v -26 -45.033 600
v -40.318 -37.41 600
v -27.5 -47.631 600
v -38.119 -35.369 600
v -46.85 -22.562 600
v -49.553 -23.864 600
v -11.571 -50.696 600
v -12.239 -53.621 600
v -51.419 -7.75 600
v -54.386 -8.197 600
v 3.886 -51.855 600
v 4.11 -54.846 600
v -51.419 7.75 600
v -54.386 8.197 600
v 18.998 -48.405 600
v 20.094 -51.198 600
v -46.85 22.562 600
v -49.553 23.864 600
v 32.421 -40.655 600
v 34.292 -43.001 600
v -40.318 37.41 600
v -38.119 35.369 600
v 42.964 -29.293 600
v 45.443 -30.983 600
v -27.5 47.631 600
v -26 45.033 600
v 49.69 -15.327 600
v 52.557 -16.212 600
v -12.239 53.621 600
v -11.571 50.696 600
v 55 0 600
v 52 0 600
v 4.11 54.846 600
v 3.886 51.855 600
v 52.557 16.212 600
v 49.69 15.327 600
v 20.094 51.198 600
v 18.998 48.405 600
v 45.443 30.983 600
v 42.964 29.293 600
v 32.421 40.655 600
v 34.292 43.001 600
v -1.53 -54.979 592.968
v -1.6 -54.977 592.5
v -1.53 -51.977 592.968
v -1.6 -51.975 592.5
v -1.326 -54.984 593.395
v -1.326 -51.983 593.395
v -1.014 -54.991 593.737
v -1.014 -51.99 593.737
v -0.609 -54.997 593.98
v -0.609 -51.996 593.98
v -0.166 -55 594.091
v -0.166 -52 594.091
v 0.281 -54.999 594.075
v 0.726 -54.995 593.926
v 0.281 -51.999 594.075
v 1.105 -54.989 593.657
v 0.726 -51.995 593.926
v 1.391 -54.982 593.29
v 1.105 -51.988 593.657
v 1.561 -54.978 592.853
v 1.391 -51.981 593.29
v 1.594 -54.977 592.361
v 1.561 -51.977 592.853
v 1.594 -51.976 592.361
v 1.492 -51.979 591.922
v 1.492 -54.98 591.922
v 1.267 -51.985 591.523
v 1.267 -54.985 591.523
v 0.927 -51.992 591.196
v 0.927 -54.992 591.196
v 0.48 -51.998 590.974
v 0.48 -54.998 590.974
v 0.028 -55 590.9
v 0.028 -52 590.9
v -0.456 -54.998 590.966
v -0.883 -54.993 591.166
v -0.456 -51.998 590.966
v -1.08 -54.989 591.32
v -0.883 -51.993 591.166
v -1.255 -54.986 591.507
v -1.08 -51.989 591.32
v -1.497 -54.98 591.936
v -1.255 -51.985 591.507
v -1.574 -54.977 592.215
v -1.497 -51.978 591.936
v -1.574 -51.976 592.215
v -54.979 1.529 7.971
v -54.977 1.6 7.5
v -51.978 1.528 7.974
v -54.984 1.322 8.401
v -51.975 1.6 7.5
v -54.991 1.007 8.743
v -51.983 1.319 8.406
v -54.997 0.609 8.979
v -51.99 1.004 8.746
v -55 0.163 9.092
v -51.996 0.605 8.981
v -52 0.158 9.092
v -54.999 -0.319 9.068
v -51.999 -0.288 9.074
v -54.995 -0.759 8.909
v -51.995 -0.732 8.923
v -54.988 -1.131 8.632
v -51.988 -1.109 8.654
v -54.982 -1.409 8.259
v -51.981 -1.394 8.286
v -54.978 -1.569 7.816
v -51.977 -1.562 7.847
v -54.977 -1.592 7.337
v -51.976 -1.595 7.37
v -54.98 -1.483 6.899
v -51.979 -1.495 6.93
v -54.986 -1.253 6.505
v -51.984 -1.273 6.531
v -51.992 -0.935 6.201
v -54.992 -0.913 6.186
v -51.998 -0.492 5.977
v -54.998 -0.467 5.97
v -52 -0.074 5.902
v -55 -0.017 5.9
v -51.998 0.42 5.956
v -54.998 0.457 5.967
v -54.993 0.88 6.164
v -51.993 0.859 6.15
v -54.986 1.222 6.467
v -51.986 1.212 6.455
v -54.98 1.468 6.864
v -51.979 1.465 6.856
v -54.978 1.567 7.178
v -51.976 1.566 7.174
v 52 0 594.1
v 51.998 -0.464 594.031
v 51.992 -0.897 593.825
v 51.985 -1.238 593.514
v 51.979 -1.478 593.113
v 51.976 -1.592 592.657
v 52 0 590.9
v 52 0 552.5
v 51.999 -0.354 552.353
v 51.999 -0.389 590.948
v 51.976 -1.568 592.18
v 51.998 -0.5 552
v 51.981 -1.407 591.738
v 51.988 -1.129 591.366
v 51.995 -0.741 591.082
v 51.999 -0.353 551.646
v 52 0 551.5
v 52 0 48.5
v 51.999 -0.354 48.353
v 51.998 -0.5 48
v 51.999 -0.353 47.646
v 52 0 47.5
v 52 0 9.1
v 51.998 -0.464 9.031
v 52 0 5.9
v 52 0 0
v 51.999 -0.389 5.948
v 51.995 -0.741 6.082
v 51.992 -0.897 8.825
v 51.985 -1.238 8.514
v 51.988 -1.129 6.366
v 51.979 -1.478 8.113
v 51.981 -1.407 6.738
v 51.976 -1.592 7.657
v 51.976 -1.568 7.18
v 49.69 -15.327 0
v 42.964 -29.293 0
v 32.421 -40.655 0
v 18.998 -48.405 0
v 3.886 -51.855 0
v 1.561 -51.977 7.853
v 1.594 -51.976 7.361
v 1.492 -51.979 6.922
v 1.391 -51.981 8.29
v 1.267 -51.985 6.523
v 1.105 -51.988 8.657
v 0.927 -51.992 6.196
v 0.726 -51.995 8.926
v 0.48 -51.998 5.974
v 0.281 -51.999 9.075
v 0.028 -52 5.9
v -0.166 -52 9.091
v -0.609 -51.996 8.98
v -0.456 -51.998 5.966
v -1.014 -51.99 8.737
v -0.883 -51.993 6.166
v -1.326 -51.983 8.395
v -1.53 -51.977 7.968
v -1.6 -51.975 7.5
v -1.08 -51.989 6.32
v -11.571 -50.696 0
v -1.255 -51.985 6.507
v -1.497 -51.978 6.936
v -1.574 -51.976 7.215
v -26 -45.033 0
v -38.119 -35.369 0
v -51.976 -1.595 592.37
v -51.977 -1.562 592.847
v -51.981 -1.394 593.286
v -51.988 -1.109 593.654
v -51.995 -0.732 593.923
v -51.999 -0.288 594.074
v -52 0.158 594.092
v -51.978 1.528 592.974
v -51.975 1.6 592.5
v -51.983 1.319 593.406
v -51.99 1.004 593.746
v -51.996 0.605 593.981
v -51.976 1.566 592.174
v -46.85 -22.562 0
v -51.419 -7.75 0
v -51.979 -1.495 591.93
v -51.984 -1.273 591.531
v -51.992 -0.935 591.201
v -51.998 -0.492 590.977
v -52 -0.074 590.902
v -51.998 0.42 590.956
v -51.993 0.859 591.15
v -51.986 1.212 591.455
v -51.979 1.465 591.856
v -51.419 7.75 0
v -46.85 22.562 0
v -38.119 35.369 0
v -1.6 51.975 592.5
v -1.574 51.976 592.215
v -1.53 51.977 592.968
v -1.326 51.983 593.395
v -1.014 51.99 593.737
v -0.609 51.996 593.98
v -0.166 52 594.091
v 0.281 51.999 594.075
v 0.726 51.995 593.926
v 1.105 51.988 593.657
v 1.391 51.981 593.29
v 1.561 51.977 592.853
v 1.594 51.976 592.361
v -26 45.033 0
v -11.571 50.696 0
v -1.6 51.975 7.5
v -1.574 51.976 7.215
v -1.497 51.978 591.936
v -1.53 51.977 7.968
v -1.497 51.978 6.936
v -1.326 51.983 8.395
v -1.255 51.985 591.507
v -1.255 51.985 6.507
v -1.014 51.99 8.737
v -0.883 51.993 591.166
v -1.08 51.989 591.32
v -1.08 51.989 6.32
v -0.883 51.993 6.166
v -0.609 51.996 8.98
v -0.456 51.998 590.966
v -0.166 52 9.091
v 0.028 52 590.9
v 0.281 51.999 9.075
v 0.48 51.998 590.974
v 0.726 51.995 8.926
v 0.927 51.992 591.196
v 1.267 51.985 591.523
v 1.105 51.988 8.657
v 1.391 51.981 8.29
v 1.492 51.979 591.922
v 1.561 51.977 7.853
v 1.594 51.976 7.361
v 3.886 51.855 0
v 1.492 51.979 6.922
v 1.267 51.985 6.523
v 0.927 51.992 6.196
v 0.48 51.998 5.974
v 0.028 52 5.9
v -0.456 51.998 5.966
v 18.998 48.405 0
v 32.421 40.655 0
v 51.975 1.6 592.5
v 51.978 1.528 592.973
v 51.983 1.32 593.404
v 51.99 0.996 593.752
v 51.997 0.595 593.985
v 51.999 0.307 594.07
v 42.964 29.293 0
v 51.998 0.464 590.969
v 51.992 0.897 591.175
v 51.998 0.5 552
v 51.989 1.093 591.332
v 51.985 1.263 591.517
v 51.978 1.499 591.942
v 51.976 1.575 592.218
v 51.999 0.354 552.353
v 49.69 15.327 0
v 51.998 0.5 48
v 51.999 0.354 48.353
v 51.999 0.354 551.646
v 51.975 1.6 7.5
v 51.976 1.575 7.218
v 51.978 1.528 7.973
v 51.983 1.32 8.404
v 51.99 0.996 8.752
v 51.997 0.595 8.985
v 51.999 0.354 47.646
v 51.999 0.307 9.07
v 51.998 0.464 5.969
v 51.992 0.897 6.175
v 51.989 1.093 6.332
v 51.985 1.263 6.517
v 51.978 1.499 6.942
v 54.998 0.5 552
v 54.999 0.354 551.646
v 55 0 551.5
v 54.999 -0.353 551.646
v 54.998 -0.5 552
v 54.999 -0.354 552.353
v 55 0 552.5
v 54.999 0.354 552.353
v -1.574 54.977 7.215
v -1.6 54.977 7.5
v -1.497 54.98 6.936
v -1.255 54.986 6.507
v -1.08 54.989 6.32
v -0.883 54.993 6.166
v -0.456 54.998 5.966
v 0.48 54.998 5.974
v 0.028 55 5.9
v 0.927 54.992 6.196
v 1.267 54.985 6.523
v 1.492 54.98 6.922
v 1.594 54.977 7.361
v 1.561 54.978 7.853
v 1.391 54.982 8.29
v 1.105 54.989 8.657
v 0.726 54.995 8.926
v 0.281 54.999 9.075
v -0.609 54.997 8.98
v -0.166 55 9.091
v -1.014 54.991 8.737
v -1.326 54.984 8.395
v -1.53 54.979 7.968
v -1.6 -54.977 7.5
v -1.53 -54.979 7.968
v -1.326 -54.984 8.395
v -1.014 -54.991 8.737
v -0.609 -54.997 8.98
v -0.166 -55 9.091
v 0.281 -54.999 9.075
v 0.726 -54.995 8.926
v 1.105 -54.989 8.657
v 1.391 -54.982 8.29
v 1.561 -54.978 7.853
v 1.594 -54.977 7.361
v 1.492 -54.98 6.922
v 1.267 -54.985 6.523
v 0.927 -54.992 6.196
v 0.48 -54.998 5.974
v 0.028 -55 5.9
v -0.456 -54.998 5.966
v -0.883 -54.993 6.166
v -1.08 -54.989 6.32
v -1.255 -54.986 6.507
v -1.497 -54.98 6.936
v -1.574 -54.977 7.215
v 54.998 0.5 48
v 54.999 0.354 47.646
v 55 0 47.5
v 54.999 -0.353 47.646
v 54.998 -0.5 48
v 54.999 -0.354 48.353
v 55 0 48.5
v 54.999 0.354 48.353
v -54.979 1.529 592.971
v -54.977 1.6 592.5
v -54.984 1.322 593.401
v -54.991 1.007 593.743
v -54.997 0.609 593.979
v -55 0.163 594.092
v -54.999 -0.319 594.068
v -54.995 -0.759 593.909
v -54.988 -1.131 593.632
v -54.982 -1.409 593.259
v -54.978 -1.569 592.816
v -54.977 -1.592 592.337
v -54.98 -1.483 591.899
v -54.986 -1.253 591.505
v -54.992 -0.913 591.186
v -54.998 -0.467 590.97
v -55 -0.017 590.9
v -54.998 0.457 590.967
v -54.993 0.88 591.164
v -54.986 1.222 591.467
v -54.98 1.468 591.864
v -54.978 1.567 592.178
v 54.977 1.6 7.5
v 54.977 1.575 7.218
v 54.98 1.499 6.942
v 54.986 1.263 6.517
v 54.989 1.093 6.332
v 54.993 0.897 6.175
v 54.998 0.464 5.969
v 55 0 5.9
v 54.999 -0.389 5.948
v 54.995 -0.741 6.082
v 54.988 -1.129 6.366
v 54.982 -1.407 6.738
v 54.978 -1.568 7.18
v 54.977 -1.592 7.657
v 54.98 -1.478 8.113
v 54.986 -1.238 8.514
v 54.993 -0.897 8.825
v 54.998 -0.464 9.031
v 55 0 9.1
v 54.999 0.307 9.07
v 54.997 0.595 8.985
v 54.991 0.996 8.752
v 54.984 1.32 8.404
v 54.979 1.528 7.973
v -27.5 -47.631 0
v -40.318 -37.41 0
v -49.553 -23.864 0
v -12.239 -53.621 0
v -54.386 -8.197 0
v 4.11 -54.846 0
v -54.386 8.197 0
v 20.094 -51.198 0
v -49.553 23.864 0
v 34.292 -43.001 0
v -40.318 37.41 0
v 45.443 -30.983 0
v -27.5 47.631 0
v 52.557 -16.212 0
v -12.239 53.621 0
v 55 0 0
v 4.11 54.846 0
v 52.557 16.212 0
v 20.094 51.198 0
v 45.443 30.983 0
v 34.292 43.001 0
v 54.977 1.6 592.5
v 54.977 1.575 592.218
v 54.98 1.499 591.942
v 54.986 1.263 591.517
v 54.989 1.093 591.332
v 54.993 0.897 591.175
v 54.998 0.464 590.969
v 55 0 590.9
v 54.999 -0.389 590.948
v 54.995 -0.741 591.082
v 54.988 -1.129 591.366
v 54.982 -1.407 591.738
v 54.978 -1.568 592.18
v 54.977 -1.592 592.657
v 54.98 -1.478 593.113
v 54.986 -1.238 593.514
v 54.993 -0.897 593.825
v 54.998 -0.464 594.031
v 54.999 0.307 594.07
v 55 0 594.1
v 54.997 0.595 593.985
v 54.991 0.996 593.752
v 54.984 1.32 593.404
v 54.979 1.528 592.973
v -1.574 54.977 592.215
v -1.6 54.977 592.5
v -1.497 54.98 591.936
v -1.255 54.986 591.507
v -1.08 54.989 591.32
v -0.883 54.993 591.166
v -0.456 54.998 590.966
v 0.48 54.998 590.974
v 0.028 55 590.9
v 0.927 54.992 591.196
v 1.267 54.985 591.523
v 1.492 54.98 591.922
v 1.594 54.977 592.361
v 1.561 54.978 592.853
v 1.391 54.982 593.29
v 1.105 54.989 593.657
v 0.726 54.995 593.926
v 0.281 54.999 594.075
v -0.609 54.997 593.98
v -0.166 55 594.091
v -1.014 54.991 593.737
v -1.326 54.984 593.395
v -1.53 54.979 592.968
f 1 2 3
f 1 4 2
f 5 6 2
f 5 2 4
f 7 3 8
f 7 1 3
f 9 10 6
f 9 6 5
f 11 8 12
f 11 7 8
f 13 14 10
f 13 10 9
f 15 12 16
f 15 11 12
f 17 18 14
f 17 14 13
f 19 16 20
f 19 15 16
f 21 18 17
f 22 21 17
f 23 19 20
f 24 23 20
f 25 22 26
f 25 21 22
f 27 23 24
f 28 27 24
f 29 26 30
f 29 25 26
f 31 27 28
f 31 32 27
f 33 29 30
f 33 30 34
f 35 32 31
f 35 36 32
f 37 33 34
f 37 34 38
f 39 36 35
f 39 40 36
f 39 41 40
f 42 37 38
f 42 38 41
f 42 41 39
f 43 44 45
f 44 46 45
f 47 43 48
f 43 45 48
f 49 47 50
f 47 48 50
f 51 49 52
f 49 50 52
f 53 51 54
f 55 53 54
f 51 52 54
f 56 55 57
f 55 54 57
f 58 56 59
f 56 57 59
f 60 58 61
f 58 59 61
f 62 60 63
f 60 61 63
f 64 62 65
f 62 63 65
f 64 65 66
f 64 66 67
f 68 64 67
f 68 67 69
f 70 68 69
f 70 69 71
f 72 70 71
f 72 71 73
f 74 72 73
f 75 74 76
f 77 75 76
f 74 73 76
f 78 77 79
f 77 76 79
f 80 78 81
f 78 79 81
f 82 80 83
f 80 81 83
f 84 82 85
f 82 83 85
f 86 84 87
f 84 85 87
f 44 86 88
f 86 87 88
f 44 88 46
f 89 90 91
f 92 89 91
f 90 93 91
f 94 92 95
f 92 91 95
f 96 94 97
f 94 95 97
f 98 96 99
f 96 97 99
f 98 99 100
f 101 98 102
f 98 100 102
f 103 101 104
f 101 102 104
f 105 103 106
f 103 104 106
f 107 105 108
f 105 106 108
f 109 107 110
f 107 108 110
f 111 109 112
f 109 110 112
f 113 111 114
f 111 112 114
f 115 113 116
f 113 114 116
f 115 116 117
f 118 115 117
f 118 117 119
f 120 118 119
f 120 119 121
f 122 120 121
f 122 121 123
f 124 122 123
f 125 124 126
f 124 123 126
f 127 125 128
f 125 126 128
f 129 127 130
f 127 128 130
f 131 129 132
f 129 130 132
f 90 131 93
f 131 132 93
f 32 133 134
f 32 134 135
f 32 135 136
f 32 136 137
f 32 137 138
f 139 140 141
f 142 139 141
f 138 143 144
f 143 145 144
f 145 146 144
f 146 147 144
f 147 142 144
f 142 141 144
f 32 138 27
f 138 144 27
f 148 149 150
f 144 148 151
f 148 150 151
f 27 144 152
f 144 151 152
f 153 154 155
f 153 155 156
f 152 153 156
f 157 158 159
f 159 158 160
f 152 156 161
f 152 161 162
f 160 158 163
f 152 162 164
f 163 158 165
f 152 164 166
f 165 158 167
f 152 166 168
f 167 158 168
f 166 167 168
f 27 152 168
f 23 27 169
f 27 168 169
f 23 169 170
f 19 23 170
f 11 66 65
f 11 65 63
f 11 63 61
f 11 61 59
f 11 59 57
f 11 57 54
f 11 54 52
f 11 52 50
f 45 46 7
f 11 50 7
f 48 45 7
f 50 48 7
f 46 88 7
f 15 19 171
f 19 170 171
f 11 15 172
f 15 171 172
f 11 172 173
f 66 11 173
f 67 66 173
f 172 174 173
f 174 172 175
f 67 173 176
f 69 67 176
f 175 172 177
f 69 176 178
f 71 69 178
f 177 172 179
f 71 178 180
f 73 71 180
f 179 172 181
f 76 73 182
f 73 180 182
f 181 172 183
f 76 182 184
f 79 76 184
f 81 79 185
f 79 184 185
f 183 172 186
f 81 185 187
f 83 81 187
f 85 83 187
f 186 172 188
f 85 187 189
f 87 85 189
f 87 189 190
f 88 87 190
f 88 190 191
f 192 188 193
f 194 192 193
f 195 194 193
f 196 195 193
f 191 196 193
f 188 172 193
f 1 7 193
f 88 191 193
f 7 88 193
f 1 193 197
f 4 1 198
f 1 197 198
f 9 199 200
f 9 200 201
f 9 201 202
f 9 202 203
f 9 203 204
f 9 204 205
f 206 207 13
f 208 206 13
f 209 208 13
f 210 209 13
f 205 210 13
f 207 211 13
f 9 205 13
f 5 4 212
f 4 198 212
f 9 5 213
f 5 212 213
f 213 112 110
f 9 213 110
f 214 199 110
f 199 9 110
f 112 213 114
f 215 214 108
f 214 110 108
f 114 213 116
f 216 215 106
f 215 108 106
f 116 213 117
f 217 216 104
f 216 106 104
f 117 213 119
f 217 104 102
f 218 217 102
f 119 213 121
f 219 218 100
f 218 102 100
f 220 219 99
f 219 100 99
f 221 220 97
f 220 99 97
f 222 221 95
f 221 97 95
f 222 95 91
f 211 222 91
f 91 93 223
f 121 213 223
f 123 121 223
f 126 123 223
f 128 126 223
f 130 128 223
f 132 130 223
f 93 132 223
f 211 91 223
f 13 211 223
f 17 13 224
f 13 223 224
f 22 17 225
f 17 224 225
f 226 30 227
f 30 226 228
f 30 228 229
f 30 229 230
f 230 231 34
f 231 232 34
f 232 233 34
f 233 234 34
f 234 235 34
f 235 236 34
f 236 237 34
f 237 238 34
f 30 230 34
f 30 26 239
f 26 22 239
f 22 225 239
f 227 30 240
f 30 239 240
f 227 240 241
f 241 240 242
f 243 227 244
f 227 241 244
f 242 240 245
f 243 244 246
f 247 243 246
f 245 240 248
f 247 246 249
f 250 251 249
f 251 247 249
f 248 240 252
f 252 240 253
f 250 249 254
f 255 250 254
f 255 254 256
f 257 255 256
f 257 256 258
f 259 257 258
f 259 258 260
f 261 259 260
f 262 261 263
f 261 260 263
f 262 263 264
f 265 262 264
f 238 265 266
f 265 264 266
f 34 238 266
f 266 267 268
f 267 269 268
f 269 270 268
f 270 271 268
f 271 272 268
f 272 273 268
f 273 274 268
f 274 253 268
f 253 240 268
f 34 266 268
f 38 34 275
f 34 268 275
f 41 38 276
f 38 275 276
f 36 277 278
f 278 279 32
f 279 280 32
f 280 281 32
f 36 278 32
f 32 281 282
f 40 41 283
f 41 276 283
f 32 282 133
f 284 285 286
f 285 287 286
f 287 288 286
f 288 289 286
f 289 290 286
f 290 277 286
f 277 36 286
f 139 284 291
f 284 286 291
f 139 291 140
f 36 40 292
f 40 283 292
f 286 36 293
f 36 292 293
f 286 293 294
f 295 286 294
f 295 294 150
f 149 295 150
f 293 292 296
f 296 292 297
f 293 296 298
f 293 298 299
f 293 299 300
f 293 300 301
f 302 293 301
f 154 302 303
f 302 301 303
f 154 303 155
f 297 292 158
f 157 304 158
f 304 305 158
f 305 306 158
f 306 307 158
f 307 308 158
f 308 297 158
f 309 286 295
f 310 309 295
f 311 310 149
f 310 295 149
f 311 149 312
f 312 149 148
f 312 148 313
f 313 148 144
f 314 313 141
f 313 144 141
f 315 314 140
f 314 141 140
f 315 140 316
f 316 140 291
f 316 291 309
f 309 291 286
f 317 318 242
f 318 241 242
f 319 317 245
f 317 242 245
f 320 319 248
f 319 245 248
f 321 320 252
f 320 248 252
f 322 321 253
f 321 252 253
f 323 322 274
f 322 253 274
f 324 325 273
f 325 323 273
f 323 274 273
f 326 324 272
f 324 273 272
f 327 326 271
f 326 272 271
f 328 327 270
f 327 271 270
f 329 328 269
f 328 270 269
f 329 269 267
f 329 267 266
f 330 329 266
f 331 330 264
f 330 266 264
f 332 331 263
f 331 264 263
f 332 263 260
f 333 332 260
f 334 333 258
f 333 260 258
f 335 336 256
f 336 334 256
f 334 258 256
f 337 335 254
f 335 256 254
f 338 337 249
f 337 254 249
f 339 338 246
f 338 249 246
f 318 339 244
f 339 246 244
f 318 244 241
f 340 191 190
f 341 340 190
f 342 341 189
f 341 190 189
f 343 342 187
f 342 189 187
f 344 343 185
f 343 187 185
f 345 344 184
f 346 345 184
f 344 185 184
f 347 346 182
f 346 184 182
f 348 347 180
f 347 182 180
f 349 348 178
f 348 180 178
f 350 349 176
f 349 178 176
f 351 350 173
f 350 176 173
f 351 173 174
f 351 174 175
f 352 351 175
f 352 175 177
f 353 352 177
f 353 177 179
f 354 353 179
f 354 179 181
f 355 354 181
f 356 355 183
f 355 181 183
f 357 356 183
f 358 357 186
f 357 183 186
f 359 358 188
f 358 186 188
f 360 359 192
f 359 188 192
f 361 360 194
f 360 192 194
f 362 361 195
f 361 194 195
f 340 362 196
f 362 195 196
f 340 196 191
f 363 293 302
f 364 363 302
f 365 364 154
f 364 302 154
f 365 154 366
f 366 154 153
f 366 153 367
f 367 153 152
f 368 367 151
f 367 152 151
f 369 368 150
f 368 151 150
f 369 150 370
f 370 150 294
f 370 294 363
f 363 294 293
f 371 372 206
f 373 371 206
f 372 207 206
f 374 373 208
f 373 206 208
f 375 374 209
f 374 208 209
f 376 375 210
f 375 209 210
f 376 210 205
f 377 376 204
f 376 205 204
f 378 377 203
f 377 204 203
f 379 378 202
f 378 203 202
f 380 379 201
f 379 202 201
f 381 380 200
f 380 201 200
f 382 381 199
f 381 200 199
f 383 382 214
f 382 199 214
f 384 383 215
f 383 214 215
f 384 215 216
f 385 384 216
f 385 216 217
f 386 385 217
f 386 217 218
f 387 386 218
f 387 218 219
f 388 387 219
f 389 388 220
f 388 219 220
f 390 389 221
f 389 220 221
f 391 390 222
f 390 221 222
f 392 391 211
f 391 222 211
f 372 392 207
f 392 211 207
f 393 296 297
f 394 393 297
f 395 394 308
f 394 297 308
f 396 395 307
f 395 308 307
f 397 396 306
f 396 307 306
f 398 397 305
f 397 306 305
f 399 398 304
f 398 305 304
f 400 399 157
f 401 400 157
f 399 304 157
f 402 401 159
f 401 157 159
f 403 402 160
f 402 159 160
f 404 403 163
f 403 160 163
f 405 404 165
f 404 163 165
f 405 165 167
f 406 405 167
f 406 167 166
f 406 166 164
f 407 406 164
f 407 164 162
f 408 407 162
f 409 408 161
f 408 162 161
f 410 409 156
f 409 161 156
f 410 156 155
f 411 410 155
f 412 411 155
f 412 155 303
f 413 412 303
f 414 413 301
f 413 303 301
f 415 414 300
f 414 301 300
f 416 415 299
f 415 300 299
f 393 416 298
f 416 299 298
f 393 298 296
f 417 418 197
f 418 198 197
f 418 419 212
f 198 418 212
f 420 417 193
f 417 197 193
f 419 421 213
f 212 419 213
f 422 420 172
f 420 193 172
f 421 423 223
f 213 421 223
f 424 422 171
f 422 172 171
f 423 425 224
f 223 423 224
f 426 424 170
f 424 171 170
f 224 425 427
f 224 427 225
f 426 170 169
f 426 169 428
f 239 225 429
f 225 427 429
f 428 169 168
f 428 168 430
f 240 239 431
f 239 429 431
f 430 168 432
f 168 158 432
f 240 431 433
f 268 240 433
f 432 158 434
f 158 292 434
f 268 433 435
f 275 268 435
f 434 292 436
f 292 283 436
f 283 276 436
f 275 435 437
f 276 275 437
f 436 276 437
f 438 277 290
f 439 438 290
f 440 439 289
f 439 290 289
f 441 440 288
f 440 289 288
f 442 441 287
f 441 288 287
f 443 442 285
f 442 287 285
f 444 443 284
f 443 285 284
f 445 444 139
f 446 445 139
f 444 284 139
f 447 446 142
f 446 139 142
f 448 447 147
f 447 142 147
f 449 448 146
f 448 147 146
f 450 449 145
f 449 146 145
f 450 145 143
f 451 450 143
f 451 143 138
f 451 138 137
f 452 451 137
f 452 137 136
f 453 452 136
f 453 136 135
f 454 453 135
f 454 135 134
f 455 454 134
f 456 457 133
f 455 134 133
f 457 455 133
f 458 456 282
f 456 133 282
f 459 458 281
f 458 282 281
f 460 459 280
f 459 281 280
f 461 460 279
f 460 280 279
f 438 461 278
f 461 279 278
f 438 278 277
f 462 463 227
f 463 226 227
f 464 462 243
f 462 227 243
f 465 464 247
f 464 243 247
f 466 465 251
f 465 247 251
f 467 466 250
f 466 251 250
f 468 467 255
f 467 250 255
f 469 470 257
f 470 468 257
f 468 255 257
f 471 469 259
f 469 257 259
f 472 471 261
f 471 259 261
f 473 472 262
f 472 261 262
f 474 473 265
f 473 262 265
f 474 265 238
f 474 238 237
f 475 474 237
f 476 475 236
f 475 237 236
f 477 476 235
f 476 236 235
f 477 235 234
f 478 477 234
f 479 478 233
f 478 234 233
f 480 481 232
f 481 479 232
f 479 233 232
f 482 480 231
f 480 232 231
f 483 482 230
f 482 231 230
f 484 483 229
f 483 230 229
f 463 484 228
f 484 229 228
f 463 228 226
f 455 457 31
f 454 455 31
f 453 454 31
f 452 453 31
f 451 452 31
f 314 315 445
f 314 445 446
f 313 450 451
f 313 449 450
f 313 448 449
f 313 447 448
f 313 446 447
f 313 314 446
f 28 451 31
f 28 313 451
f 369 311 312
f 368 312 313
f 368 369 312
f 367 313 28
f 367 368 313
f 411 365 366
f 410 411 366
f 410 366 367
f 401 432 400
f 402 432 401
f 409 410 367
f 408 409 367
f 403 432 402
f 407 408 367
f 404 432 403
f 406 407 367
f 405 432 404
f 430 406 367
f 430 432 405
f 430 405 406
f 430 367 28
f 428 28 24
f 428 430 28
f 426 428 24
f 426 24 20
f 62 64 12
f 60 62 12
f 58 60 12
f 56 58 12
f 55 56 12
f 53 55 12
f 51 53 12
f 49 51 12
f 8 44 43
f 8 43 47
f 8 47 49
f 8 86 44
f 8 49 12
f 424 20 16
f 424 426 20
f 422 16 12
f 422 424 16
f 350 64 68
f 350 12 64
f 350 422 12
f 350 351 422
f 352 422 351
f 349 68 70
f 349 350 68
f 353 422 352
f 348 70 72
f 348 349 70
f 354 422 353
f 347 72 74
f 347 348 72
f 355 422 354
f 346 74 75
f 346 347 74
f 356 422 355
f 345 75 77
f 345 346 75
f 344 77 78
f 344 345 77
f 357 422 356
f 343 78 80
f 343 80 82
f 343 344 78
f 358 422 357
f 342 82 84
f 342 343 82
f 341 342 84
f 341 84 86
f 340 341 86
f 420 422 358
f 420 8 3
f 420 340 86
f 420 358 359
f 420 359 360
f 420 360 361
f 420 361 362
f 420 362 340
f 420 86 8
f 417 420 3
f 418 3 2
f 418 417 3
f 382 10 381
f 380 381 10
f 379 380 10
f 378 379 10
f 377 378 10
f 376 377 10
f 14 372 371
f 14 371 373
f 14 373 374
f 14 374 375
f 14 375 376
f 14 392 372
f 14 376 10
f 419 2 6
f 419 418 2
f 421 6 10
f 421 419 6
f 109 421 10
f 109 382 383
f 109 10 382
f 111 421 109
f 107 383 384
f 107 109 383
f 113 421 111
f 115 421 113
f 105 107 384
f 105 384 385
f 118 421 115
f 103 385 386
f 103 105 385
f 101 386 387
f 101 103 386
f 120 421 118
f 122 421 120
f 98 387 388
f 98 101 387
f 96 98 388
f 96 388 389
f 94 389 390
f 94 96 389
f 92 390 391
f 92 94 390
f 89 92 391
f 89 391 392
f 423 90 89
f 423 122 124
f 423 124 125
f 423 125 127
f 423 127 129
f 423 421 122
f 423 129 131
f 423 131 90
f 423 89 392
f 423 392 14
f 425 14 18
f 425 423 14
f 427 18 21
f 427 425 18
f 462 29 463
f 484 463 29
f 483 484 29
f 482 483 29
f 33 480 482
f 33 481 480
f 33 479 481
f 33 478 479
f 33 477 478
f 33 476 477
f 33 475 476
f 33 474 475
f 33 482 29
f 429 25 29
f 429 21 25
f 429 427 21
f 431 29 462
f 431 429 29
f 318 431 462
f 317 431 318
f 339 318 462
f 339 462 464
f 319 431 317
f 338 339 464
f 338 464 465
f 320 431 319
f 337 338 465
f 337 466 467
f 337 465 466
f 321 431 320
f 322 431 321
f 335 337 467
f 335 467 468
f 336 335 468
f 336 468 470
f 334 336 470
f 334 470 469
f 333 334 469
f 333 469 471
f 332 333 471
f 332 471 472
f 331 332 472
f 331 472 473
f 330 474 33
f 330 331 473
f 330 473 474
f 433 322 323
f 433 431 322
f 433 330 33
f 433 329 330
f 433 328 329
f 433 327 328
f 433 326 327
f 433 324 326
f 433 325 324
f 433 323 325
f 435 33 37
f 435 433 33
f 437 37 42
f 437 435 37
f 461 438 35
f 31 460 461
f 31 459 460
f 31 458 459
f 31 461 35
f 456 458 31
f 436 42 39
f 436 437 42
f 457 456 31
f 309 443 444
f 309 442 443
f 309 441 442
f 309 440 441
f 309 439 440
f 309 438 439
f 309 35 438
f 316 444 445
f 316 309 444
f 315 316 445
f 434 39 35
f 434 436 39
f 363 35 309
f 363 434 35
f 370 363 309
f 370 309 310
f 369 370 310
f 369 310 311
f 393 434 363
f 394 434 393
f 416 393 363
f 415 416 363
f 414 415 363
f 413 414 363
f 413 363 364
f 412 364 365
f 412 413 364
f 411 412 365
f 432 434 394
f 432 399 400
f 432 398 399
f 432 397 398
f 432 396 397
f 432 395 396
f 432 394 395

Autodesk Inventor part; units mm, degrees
ref_plane "YZ Plane" through (0, 0, 0) normal (1, 0, 0) x (0, 1, 0)
ref_plane "XZ Plane" through (0, 0, 0) normal (0, 1, 0) x (-1, 0, 0)
ref_plane "XY Plane" through (0, 0, 0) normal (0, 0, 1) x (1, 0, 0)
sketch "Sketch1" plane through (0, 0, 0) normal (0, 0, 1) x (1, 0, 0)
  circle A0 centre (0, 0) radius 52
  circle A1 centre (0, 0) radius 55
  dimension "d0" = 110
  dimension "d1" = 104
extrude "Extrusion1" add sketch "Sketch1" along normal blind 600
sketch "Sketch2" plane through (0, 0, 0) normal (1, 0, 0) x (0, 1, 0)
  circle A0 centre (0, 7.5) radius 1.6
  circle A1 centre (0, 592.5) radius 1.6
  line L0 (-55, 0) -> (55, 0) projected
  line L1 (55, 600) -> (-55, 600) projected
  point P0 (0, 0)
  dimension "d4" = 3.2
  dimension "d5" = 3.2
  dimension "d6" = 7.5
  dimension "d7" = 7.5
extrude "Extrusion2" cut sketch "Sketch2" along normal through all both and the other way through all
sketch "Sketch3" plane through (0, 0, 0) normal (0, 1, 0) x (-1, 0, 0)
  circle A0 centre (0, 7.5) radius 1.6
  line L0 (-55, 0) -> (55, 0) projected
  circle A1 centre (0, 592.5) radius 1.6
  line L1 (55, 600) -> (-55, 600) projected
  point P0 (0, 0)
  point P1 (0, 0)
  dimension "d10" = 3.2
  dimension "d11" = 7.5
  dimension "d12" = 3.2
  dimension "d13" = 7.5
extrude "Extrusion3" cut sketch "Sketch3" along normal through all both and the other way through all
sketch "Sketch4" plane through (0, 0, 0) normal (1, 0, 0) x (0, 1, 0)
  circle A0 centre (0, 48) radius 0.5
  circle A1 centre (0, 552) radius 0.5
  line L0 (-55, 0) -> (55, 0) projected
  line L1 (55, 600) -> (-55, 600) projected
  point P0 (0, 0)
  point P1 (0, 0)
  dimension "d16" = 1
  dimension "d17" = 1
  dimension "d18" = 48
  dimension "d19" = 48
extrude "Extrusion4" cut sketch "Sketch4" along normal through all
properties part number "Secondary" material "Polycarbonate, Clear"
